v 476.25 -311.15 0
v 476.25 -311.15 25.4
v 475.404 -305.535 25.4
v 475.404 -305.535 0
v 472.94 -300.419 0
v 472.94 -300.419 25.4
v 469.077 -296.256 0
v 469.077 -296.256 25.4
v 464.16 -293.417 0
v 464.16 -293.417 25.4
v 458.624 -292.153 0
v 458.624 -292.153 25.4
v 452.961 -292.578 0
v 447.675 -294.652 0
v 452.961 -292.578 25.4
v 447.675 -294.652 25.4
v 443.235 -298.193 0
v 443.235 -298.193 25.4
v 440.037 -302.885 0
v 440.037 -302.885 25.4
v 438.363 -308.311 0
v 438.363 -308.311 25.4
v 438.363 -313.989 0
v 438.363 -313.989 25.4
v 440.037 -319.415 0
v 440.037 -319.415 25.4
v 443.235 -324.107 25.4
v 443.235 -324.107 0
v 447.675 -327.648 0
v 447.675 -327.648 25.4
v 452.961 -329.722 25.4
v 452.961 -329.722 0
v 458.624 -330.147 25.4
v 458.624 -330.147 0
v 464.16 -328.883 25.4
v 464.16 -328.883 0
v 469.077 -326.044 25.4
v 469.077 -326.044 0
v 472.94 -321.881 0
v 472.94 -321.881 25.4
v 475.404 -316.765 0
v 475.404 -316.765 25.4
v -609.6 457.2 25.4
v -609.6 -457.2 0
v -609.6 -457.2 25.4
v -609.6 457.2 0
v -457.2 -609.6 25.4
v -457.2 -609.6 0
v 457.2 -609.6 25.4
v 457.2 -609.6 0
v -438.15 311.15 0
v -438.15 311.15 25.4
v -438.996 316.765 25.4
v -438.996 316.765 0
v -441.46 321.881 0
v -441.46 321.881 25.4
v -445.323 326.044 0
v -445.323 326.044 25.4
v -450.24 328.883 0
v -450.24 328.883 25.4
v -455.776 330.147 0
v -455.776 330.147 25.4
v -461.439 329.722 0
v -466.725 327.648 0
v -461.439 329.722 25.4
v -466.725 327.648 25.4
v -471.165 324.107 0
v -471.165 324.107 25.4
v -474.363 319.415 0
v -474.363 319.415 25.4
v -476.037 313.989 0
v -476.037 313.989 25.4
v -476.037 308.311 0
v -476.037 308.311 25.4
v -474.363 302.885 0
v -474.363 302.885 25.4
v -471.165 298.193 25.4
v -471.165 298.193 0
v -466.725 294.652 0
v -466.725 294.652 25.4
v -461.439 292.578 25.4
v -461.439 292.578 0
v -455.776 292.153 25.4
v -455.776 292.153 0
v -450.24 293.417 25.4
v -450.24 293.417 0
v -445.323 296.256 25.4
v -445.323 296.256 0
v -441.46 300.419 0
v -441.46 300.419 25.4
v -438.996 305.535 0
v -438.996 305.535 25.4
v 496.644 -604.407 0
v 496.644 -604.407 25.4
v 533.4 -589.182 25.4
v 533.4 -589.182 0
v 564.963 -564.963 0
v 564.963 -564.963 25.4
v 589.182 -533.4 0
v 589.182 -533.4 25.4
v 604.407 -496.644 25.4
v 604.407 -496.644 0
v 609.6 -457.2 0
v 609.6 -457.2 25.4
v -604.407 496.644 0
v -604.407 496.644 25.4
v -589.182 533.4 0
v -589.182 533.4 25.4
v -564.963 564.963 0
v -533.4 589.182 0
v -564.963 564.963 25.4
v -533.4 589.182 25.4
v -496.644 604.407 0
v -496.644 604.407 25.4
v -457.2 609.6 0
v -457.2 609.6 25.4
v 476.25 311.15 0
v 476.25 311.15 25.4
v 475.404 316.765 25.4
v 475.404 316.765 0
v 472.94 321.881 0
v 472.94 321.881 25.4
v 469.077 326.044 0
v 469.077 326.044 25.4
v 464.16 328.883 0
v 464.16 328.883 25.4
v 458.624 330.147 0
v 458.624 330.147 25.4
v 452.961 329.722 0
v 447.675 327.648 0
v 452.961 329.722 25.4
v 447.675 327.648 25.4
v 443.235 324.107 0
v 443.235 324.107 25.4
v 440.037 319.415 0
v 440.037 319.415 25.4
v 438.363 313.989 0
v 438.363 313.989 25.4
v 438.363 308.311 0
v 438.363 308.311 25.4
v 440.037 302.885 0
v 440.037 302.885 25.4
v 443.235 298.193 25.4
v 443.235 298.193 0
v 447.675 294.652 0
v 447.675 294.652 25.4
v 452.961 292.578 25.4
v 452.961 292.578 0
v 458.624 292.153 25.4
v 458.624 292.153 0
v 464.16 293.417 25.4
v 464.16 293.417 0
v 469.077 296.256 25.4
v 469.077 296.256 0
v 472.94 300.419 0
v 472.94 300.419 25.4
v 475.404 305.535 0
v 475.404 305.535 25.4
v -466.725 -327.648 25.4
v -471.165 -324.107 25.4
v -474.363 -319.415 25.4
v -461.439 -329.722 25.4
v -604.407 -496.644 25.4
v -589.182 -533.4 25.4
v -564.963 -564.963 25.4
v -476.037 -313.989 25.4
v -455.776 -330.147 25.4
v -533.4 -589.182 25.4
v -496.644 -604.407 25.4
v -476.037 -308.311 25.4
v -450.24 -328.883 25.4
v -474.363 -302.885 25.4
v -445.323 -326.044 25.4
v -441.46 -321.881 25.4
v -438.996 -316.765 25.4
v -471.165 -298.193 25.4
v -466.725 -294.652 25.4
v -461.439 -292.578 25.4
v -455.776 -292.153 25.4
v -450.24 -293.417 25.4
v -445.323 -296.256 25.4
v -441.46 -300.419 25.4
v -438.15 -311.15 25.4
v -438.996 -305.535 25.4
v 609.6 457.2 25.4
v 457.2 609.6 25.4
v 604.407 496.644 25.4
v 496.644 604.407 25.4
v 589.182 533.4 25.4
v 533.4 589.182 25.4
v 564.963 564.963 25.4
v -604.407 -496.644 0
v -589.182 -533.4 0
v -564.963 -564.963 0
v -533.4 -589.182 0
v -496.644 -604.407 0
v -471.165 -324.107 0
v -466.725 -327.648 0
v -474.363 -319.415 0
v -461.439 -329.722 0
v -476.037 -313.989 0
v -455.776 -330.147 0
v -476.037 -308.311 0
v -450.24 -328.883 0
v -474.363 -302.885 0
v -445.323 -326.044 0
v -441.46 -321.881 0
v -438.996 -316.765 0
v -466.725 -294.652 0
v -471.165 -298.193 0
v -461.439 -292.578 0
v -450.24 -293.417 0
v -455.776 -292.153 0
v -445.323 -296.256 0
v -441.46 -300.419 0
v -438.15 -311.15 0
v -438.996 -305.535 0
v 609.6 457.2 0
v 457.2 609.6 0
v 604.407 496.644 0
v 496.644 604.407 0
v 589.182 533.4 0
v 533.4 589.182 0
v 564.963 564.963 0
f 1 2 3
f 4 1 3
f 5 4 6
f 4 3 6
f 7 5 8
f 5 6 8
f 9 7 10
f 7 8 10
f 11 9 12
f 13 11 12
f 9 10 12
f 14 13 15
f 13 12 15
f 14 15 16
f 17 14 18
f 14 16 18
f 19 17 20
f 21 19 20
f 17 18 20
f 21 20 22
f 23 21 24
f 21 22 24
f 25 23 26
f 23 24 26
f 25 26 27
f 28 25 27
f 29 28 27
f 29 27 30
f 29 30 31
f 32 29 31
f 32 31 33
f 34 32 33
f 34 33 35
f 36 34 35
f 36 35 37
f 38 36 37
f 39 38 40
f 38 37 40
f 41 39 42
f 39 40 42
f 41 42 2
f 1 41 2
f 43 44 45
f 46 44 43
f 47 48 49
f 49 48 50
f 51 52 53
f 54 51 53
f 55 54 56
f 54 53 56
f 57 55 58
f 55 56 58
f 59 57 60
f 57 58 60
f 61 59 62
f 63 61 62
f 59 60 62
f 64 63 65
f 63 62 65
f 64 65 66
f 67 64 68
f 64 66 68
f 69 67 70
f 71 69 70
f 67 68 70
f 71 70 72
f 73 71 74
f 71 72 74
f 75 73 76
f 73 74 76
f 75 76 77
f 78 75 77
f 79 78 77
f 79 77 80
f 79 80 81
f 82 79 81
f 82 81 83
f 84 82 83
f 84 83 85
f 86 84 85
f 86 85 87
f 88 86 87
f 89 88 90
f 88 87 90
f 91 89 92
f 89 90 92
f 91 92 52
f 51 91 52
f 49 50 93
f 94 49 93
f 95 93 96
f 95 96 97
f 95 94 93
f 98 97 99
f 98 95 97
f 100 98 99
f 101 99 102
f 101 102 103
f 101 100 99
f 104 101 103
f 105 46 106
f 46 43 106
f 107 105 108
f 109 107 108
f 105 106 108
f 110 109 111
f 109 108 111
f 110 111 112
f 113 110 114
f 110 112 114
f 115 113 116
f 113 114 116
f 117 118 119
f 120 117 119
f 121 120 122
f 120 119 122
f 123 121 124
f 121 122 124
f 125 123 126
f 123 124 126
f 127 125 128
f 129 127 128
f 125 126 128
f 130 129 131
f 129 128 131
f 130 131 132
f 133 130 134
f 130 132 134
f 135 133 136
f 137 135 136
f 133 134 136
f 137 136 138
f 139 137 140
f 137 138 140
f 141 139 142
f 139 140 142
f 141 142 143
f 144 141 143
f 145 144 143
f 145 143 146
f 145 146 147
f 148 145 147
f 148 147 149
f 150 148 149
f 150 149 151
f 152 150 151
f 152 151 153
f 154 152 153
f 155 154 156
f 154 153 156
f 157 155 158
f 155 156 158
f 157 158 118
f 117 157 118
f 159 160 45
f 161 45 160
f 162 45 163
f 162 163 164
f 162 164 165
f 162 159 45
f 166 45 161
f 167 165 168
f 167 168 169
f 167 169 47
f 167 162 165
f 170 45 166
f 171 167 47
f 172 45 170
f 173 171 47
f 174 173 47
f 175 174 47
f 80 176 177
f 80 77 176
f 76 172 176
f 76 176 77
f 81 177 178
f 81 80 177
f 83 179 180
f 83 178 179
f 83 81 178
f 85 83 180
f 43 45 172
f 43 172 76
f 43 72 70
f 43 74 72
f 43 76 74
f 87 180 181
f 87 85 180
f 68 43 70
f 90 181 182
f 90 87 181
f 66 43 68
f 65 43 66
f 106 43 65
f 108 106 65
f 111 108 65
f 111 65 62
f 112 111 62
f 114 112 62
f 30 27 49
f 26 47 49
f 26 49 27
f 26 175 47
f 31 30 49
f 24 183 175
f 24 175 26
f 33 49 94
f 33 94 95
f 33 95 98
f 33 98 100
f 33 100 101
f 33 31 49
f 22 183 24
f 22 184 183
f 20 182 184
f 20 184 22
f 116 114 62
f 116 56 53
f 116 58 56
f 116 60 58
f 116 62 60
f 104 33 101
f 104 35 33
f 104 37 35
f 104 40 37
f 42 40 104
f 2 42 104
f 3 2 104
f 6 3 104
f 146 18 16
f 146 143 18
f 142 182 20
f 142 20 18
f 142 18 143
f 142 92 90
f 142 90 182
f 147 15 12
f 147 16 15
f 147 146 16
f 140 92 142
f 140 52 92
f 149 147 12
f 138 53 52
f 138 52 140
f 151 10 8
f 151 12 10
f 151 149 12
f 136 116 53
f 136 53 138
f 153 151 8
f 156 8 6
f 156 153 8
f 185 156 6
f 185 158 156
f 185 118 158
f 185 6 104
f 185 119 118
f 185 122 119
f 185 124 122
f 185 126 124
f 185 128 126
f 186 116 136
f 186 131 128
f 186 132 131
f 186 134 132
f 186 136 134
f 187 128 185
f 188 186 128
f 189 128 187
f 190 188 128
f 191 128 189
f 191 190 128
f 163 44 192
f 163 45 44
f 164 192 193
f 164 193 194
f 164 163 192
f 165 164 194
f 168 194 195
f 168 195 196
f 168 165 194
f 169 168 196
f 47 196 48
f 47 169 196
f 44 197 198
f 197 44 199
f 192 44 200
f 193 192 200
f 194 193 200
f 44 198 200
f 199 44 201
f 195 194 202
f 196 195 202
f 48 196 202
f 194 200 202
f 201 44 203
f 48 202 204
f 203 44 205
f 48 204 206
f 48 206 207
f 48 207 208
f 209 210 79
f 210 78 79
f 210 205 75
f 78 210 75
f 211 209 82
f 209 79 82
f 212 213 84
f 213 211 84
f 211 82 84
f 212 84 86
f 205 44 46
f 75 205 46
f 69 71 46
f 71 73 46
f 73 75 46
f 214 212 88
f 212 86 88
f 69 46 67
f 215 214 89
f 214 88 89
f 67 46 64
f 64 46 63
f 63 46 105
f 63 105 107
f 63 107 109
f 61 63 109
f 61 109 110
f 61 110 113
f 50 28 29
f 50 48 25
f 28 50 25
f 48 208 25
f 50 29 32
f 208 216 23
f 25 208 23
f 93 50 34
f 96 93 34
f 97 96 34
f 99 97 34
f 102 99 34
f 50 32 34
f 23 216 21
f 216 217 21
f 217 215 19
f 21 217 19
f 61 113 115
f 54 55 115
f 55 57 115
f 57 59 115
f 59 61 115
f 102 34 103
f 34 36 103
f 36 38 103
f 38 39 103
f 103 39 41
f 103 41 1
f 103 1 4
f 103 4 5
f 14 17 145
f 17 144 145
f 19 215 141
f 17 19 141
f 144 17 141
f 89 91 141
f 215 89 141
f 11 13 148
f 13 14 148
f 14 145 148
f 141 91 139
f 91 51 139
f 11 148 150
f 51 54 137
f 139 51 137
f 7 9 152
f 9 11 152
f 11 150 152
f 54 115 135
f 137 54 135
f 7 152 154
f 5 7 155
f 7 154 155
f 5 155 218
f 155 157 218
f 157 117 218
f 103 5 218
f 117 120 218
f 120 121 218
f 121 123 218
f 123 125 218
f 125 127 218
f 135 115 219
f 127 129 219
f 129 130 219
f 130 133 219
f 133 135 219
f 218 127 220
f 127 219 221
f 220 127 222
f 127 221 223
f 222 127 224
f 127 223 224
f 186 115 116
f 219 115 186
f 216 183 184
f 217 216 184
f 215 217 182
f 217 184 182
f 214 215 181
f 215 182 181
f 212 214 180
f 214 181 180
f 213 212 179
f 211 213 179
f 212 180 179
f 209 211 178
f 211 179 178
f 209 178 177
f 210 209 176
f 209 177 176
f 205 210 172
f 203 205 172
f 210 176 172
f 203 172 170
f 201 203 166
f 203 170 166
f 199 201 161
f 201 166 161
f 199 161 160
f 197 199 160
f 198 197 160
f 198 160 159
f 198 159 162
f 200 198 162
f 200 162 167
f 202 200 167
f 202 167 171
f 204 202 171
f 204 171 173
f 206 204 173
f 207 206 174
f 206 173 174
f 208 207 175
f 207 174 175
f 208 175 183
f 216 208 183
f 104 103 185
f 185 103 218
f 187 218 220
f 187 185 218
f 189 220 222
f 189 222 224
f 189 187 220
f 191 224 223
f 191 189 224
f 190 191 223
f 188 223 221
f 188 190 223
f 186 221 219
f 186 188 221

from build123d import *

# Parameters (mm, degrees)
F0_W     = 1219.2
F0_H     = 1219.2
F1_DEPTH = 25.4
F2_R     = 152.4
F3_R     = 19.05
F4_DEPTH = 25.4


with BuildPart() as f1:
    # F0 (on Top) → F1 (new body)
    with BuildSketch(Plane.XY):
        Rectangle(F0_W, F0_H)
    extrude(amount=F1_DEPTH)

    # F2
    f2_edges = [f1.edges().sort_by_distance(p)[0] for p in [
        (-609.6, -609.6, 12.7),
        (609.6, -609.6, 12.7),
        (609.6, 609.6, 12.7),
        (-609.6, 609.6, 12.7),
    ]]
    fillet(f2_edges, radius=F2_R)

    # F3 (on face) → F4 (cut)
    with BuildSketch(Plane.XY.offset(25.4)):
        with Locations((-457.2, 311.15)):
            Circle(F3_R)
        with Locations((457.2, 311.15)):
            Circle(F3_R)
        with Locations((457.2, -311.15)):
            Circle(F3_R)
        with Locations((-457.2, -311.15)):
            Circle(F3_R)
    extrude(amount=-F4_DEPTH, mode=Mode.SUBTRACT)


solid = f1.part
